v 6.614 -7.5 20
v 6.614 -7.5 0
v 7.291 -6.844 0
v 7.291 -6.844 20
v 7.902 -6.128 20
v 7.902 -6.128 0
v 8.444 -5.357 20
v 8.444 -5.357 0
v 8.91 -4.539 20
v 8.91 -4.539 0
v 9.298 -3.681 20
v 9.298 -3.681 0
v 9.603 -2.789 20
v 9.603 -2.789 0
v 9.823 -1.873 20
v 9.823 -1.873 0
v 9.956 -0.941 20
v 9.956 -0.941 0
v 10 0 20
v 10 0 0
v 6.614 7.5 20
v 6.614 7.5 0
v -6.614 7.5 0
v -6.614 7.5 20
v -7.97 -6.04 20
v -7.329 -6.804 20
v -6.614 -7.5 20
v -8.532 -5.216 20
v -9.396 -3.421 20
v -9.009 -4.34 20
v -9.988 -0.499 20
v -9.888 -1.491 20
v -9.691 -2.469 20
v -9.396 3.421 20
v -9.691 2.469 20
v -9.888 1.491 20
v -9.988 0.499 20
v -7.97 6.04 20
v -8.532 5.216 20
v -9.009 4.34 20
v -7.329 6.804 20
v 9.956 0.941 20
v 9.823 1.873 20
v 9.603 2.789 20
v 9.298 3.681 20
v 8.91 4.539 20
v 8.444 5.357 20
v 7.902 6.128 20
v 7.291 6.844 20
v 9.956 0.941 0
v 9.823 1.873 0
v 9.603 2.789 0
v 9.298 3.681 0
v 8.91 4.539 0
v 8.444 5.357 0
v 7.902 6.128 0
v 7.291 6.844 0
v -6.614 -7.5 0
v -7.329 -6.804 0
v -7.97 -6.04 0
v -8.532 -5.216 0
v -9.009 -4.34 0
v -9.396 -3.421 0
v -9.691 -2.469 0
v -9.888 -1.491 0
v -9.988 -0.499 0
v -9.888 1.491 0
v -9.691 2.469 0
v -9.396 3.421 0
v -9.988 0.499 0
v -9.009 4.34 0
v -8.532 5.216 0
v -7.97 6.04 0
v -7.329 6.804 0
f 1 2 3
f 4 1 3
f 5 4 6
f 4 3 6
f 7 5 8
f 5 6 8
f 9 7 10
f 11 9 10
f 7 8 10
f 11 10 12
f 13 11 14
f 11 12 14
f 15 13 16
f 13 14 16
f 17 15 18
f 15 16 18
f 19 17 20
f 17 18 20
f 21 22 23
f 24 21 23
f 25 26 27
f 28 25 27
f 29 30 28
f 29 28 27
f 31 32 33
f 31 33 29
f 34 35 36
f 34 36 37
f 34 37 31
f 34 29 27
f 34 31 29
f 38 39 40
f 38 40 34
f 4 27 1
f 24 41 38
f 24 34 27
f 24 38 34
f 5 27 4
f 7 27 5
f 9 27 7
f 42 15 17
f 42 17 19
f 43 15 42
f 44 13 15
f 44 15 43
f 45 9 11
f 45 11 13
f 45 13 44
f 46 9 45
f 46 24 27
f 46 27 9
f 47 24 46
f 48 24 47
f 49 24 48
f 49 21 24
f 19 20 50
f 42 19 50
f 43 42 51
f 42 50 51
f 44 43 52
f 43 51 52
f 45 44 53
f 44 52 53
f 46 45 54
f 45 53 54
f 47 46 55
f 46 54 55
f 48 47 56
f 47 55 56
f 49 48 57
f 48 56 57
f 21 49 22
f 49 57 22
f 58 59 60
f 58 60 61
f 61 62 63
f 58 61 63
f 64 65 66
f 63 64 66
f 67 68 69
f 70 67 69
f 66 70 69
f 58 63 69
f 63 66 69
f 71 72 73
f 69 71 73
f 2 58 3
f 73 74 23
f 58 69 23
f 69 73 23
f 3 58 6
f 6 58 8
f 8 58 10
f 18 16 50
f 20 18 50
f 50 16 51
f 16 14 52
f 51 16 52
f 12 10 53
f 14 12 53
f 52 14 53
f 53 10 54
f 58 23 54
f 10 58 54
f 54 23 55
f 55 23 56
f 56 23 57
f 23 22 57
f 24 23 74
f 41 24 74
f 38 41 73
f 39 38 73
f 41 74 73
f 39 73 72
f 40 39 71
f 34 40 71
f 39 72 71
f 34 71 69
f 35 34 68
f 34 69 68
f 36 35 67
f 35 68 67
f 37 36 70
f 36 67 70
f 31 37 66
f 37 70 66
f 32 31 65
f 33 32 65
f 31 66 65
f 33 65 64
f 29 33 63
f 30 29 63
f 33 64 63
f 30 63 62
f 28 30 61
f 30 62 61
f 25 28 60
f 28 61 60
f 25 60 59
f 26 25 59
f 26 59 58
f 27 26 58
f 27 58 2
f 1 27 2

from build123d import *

# Parameters (mm, degrees)
F1_DEPTH = 20


with BuildPart() as f1:
    # F0 (on Top) → F1 (new body)
    with BuildSketch(Plane.XY):
        with BuildLine():
            ThreePointArc((6.614378, -7.5), (9.114378, -4.114378), (10, 0))
            ThreePointArc((10, 0), (9.114378, 4.114378), (6.614378, 7.5))
            Line((6.614378, 7.5), (-6.614378, 7.5))
            ThreePointArc((-6.614378, 7.5), (-10, 0), (-6.614378, -7.5))
            Line((-6.614378, -7.5), (6.614378, -7.5))
        make_face()
    extrude(amount=F1_DEPTH)


solid = f1.part
